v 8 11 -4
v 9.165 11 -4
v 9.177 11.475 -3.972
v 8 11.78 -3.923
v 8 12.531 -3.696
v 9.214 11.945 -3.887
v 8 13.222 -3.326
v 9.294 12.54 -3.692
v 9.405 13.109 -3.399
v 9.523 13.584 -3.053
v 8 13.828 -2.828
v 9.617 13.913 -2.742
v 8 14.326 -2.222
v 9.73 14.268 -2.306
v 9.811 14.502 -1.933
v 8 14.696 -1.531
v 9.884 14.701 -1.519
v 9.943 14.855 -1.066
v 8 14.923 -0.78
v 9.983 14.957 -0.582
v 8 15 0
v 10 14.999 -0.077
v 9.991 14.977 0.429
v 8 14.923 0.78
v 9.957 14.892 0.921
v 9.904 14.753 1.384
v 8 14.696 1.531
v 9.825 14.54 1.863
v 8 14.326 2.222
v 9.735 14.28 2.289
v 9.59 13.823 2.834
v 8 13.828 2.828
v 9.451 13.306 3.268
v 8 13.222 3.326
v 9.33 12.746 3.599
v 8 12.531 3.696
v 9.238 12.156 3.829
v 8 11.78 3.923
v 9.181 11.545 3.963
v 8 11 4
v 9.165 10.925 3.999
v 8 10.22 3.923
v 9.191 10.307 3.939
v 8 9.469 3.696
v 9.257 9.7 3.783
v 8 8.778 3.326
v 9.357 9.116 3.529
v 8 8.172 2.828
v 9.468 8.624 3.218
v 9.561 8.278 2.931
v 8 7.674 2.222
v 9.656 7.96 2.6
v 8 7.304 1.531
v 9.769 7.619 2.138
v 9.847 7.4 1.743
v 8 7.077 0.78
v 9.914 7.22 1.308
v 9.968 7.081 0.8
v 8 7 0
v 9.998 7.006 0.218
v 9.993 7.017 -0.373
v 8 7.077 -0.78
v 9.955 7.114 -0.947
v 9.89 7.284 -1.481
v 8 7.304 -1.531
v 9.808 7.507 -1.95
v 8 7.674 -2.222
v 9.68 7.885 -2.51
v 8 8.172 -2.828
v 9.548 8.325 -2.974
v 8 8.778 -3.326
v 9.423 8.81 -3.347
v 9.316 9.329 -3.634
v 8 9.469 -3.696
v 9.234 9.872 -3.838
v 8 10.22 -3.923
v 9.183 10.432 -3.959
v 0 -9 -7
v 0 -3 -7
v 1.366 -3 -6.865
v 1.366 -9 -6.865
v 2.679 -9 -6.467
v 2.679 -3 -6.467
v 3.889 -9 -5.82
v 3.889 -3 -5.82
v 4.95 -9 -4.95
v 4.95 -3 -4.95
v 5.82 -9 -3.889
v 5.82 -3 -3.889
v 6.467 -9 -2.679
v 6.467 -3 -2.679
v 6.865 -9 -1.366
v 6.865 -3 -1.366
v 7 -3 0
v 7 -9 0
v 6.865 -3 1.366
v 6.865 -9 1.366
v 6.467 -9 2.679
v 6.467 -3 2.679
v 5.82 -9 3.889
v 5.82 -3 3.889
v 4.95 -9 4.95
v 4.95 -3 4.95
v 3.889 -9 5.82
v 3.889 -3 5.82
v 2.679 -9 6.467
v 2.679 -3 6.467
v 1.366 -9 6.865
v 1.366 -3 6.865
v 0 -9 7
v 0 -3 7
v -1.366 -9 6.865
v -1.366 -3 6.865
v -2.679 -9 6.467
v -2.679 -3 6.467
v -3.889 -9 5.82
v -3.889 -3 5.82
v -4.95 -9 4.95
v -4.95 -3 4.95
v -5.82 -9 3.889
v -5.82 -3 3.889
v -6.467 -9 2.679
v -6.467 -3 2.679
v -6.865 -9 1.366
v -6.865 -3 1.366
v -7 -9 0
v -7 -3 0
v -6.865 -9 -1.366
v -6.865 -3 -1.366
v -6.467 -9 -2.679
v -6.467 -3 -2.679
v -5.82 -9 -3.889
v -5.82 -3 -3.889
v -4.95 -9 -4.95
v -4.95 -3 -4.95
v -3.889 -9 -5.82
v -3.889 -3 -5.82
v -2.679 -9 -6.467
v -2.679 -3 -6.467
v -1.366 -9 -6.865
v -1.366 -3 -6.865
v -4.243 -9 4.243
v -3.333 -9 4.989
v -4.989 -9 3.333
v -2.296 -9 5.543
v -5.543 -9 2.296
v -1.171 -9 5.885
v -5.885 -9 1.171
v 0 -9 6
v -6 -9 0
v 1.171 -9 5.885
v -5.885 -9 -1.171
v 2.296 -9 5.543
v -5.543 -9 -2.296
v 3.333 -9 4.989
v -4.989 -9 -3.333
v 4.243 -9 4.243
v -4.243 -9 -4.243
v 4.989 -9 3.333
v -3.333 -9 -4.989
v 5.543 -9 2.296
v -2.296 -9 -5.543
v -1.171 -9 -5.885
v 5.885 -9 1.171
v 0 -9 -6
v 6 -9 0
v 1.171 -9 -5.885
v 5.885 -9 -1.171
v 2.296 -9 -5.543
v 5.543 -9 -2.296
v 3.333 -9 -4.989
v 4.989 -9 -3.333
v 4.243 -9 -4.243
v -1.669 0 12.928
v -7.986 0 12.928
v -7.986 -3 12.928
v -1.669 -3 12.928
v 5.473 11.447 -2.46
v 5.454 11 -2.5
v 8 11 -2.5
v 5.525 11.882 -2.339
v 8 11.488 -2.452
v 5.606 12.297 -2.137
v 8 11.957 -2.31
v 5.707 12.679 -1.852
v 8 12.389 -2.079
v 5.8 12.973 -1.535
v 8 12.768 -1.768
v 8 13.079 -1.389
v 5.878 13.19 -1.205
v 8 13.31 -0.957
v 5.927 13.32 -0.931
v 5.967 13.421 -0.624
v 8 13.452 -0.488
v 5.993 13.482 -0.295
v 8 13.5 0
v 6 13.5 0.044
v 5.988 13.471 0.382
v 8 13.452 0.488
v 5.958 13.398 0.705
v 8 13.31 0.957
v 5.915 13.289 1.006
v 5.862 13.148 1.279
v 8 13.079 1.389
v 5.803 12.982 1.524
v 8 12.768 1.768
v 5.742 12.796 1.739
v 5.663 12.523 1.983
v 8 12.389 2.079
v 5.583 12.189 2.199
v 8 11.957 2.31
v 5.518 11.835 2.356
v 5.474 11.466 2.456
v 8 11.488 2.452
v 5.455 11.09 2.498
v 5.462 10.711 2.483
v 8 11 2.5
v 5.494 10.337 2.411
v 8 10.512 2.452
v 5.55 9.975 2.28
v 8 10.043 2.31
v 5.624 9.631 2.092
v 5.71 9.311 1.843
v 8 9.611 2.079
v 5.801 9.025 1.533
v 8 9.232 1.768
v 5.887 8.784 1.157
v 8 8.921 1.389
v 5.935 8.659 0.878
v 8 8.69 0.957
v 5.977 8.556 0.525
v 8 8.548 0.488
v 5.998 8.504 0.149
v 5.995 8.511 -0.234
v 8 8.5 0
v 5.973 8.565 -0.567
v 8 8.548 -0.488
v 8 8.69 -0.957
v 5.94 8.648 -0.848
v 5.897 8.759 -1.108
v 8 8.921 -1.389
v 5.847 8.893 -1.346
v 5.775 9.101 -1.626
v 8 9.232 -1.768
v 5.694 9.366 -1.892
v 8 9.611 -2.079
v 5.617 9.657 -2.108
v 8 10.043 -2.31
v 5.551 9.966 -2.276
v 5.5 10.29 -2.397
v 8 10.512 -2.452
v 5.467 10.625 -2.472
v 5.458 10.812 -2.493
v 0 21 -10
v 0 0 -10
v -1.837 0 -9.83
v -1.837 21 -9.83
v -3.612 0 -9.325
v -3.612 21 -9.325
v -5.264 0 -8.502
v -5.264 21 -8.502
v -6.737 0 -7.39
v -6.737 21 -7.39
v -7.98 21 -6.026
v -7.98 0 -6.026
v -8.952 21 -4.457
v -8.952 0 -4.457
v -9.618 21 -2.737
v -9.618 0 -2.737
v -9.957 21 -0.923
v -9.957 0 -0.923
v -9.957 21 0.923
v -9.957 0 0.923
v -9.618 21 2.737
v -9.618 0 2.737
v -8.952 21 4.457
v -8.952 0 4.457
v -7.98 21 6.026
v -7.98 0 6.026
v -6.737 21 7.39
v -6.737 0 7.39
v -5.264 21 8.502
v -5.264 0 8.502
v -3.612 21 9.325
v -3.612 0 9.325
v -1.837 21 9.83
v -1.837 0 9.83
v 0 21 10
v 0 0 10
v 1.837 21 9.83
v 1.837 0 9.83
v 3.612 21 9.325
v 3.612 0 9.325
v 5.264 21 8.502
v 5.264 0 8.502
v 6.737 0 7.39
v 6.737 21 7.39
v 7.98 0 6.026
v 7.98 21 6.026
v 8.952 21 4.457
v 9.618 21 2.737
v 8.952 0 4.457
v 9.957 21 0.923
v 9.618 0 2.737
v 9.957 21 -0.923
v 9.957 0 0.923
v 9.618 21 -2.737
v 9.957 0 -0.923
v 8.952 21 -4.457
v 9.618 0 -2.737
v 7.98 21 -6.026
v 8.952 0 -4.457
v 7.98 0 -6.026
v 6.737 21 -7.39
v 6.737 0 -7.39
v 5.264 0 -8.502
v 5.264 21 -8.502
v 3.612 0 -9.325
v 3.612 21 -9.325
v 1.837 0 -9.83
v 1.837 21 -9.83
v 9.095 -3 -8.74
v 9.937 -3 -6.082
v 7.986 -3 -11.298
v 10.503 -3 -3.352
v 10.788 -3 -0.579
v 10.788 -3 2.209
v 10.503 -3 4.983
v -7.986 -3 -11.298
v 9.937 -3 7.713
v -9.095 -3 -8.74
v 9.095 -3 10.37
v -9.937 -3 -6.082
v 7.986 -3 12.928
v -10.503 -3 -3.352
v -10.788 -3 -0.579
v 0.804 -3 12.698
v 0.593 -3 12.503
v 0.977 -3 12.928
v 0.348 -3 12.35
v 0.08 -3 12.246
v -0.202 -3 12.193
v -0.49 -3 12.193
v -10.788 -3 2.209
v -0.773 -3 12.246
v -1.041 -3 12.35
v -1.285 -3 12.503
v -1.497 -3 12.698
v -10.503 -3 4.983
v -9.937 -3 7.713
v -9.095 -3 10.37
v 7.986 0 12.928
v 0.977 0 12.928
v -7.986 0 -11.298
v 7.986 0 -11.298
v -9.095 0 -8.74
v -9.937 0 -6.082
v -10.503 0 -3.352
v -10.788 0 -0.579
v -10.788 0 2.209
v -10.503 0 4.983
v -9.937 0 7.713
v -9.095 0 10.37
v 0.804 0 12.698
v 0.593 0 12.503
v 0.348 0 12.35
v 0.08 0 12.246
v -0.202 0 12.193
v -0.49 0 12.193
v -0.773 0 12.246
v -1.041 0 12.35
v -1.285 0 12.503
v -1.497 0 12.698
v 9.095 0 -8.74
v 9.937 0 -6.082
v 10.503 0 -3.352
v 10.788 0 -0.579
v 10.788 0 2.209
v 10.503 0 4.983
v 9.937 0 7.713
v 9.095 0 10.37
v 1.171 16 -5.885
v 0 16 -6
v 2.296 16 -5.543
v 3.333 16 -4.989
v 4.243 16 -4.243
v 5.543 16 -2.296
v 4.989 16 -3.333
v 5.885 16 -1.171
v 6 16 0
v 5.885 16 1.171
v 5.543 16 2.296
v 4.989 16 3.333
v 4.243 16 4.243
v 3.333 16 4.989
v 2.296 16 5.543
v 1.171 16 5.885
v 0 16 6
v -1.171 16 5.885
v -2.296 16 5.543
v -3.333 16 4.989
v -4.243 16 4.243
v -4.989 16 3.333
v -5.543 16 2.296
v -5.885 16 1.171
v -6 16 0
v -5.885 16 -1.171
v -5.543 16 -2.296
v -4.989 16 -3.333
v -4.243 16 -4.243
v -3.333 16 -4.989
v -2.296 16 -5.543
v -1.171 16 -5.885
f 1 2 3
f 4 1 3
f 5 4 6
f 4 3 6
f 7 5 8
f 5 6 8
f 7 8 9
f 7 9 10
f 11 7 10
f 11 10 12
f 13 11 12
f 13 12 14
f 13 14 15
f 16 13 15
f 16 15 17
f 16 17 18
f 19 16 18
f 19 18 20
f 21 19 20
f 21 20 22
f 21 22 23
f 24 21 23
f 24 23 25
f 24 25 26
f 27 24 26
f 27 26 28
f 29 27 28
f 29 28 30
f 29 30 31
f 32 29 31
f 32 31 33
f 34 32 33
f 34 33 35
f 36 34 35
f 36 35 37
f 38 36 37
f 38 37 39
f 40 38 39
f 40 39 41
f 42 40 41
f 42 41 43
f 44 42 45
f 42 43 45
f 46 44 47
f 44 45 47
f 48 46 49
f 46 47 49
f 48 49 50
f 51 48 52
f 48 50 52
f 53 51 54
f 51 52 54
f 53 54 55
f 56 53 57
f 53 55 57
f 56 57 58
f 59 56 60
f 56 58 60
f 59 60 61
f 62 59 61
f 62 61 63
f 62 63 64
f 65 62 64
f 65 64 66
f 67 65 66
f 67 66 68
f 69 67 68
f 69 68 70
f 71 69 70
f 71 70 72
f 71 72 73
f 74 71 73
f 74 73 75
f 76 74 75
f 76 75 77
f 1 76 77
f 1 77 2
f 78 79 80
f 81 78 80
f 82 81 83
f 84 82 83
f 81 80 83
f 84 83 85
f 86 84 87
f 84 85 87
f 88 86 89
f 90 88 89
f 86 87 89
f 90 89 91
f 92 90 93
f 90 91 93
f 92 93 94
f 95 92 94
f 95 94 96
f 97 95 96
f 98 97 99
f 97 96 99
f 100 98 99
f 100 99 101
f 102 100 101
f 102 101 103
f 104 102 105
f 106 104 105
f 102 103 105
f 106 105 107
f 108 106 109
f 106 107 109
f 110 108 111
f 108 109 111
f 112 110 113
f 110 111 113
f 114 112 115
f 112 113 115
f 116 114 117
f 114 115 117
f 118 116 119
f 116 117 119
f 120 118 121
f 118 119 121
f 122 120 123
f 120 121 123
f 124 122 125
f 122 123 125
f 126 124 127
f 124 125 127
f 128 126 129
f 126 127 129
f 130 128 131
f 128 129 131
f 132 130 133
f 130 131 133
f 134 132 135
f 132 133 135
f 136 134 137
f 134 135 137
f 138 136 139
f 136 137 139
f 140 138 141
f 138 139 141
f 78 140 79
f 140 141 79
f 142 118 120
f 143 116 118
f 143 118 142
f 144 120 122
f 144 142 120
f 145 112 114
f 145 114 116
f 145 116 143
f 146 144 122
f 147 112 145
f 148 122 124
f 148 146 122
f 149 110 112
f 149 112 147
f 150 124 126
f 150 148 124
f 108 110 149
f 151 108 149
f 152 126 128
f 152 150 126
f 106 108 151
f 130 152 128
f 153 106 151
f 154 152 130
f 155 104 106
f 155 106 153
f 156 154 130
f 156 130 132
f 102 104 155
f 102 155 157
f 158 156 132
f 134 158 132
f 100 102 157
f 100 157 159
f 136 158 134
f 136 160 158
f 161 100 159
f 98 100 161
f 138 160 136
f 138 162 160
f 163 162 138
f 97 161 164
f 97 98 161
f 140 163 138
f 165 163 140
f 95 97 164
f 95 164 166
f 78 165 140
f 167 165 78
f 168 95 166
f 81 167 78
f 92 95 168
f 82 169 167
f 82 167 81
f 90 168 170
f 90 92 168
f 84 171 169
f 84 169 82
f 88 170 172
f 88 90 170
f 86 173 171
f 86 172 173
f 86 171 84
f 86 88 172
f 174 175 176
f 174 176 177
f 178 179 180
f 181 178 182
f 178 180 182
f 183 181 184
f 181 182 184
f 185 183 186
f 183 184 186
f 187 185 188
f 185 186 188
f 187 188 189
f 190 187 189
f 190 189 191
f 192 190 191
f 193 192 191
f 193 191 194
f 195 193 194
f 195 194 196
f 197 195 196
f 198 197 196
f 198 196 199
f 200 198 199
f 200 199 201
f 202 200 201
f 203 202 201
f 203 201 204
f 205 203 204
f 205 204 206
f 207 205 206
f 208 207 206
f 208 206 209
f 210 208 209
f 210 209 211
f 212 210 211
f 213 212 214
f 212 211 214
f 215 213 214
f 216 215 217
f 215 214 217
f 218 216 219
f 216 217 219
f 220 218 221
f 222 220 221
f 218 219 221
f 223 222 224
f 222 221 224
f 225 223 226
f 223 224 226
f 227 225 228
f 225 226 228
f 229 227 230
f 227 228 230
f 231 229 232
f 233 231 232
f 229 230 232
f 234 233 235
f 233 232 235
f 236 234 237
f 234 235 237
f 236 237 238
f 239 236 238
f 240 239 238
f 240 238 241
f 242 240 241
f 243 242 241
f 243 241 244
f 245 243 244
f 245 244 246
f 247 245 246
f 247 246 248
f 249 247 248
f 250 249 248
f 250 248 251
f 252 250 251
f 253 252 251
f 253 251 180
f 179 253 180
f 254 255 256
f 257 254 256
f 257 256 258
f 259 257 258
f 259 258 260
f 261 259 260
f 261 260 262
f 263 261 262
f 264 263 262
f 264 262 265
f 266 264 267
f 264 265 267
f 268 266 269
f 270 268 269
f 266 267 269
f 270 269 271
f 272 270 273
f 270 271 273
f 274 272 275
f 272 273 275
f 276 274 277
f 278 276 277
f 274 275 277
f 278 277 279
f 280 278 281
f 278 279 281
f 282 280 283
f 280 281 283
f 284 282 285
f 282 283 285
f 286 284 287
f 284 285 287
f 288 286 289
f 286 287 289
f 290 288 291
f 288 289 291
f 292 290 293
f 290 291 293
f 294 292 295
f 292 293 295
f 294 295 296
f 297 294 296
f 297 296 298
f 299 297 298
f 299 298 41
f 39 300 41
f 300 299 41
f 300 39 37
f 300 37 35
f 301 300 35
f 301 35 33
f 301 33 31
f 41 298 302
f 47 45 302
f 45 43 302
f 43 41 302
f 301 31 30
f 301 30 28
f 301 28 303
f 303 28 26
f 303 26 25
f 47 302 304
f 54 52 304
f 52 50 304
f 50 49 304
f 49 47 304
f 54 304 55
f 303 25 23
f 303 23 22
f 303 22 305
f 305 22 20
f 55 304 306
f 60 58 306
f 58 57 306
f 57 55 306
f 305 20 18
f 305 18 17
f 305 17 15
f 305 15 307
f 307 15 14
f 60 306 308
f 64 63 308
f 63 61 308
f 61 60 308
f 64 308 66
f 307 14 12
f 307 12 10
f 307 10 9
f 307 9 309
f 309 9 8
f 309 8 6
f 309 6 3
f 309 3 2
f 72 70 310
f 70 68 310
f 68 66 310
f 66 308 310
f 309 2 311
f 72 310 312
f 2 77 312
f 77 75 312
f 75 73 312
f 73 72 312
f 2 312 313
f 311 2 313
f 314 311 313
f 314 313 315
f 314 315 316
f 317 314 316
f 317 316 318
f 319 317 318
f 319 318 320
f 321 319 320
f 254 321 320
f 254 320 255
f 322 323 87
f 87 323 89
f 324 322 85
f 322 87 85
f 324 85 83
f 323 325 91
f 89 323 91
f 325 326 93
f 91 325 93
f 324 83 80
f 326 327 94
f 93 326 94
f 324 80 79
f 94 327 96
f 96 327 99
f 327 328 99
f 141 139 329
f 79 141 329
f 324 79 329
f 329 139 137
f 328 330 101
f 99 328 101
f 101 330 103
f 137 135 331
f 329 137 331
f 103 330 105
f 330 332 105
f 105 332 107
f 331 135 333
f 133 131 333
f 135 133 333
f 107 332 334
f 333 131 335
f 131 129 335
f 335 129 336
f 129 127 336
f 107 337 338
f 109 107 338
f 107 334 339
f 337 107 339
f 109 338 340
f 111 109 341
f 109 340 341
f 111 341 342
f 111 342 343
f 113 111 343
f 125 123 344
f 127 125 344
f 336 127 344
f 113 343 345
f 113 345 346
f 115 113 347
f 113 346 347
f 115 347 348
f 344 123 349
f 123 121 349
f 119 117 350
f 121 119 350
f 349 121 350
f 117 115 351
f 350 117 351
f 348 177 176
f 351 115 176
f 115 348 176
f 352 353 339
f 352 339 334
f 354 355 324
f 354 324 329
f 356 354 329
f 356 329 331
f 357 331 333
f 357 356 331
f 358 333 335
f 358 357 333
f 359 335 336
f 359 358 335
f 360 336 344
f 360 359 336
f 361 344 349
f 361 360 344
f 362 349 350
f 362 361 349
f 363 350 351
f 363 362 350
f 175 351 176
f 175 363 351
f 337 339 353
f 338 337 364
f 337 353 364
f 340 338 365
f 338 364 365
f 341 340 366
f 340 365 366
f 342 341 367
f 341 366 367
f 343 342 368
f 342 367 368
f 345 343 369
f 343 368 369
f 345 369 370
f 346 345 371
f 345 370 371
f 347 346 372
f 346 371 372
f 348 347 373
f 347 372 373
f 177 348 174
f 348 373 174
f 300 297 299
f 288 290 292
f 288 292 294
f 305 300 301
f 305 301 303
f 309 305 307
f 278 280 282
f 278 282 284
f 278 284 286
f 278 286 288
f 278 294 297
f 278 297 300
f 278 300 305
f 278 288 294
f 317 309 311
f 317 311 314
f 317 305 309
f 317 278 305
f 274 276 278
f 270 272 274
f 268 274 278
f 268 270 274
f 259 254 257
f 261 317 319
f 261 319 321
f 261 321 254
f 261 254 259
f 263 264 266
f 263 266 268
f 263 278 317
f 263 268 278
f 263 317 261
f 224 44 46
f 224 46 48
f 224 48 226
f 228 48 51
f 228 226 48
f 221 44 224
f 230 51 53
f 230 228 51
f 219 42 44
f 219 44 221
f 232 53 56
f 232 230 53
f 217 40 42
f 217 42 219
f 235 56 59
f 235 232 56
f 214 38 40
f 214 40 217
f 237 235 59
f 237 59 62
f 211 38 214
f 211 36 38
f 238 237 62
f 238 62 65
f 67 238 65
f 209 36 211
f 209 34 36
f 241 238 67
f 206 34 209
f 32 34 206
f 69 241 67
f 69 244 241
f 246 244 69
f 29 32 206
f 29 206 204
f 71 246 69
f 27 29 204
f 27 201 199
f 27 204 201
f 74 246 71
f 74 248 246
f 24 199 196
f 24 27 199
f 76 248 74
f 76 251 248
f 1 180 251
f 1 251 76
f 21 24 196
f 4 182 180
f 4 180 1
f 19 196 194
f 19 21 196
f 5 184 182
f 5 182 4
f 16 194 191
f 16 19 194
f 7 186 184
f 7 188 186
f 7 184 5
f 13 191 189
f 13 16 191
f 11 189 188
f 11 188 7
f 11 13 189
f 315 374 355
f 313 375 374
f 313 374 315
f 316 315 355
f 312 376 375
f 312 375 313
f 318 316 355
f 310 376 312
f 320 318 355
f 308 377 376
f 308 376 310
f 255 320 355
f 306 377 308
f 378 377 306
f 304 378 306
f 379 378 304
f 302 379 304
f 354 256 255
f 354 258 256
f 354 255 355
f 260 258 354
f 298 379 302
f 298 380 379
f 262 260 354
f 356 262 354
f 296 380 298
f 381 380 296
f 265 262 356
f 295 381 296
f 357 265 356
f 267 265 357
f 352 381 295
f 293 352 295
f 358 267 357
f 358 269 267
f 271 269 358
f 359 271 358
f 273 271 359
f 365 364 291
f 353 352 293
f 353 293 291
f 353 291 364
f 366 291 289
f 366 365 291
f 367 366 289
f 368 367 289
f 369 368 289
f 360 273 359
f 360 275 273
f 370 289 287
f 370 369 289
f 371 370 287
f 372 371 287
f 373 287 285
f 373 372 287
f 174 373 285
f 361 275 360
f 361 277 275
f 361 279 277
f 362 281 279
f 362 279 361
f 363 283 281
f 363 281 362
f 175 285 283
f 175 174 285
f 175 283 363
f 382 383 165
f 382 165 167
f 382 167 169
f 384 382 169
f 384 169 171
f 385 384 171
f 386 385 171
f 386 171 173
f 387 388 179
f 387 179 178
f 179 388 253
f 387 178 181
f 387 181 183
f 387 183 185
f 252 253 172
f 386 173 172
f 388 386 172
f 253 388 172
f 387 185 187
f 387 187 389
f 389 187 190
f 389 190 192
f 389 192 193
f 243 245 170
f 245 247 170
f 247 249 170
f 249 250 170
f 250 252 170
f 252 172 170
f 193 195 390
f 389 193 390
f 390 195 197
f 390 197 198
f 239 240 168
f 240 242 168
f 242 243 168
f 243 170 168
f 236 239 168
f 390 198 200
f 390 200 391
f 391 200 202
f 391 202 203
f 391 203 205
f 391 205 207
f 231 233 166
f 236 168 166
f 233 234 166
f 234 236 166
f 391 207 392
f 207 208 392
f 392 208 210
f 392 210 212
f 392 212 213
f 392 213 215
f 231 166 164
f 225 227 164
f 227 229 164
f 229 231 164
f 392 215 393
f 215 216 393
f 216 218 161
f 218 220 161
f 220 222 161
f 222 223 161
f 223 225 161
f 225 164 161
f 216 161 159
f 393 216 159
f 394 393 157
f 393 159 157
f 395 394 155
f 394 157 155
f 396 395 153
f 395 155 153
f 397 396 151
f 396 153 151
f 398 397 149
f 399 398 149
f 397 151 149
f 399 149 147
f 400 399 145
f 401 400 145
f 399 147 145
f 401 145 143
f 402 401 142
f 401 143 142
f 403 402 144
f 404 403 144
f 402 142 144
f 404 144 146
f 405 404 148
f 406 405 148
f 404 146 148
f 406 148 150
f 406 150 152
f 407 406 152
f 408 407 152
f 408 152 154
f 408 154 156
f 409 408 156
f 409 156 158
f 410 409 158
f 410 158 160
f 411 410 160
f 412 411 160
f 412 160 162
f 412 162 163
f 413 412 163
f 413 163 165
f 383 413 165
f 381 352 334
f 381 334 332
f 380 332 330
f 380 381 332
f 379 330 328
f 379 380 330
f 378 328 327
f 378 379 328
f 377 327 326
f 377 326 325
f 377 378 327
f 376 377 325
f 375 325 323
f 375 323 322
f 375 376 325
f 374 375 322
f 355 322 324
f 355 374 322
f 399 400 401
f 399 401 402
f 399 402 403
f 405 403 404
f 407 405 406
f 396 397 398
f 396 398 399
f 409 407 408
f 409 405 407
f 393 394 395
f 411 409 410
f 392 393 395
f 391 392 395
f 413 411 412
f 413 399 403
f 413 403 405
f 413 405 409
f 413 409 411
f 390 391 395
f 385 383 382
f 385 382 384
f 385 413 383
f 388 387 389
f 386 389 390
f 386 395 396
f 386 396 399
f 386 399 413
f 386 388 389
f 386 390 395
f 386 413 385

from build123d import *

# Parameters (mm, degrees)
SKETCH1_R               = 10
BOSS_EXTRUDE1_DEPTH     = 21
BOSS_EXTRUDE2_DEPTH     = 3
SKETCH3_R               = 7
BOSS_EXTRUDE3_DEPTH     = 6
SKETCH4_R               = 6
CUT_EXTRUDE1_DEPTH      = 25
SKETCH5_R               = 4
CUT_EXTRUDE2_DEPTH      = 2
CUT_EXTRUDE3_REACH      = 34.276
CUT_EXTRUDE3_END_RADIUS = 6
SKETCH5_3_R             = 2.5
SKETCH6_R               = 1.55
CUT_EXTRUDE4_DEPTH      = 27.931170886


with BuildPart() as part:
    # Sketch1 → Boss-Extrude1 (new body)
    with BuildSketch(Plane(origin=(0, 0, 0), x_dir=(1, 0, 0), z_dir=(0, 1, 0))):
        with Locations(Location((0, 0, 0), (0, 0, 90))):
            Circle(SKETCH1_R)
    extrude(amount=BOSS_EXTRUDE1_DEPTH)

    # Sketch2 → Boss-Extrude2 (add)
    with BuildSketch(Plane.XZ):
        with BuildLine():
            Line((-7.985787442, 12.928156025), (7.985787442, 12.928156025))
            ThreePointArc((7.985787442, 12.928156025), (10.823619675, 0.815257434), (7.985787442, -11.297641157))
            Line((7.985787442, -11.297641157), (-7.985787442, -11.297641157))
            ThreePointArc((-7.985787442, -11.297641157), (-10.823619675, 0.815257434), (-7.985787442, 12.928156025))
        make_face()
    extrude(amount=BOSS_EXTRUDE2_DEPTH)

    # Sketch3 → Boss-Extrude3 (add)
    with BuildSketch(Plane.XZ.offset(3)):
        with Locations(Location((0, 0, 0), (0, 0, 270))):
            Circle(SKETCH3_R)
    extrude(amount=BOSS_EXTRUDE3_DEPTH)

    # Sketch4 → Cut-Extrude1 (cut)
    with BuildSketch(Plane.XZ.offset(9)):
        with Locations(Location((0, 0, 0), (0, 0, 270))):
            Circle(SKETCH4_R)
    extrude(amount=-CUT_EXTRUDE1_DEPTH, mode=Mode.SUBTRACT)

    # Sketch5 → Cut-Extrude2 (cut)
    with BuildSketch(Plane(origin=(10, 0, 0), x_dir=(0, 0, -1), z_dir=(1, 0, 0))):
        with Locations((0, 11)):
            Circle(SKETCH5_R)
    extrude(amount=-CUT_EXTRUDE2_DEPTH, mode=Mode.SUBTRACT)

    # Cut-Extrude3: up to this cylinder (the profile starts outside it)
    cut_extrude3_end = Plane(origin=(0, 11, 0), z_dir=(0, -1, 0)) * Cylinder(CUT_EXTRUDE3_END_RADIUS, 81.552, mode=Mode.PRIVATE)
    # Sketch5<3> → Cut-Extrude3 (cut, up to the surface)
    with BuildSketch(Plane(origin=(10, 0, 0), x_dir=(0, 0, -1), z_dir=(1, 0, 0)), mode=Mode.PRIVATE) as cut_extrude3_sk1:
        with Locations((0, 11)):
            Circle(SKETCH5_3_R)
    cut_extrude3_tool1 = extrude(cut_extrude3_sk1.sketch, amount=-CUT_EXTRUDE3_REACH, mode=Mode.PRIVATE) - cut_extrude3_end
    add(cut_extrude3_tool1.solids().sort_by_distance((10, 11, 0))[0], mode=Mode.SUBTRACT)

    # Sketch6 → Cut-Extrude4 (cut, through all)
    with BuildSketch(Plane(origin=(0, 0, 0), x_dir=(1, 0, 0), z_dir=(0, 1, 0))):
        with Locations((0.39625422, 13.700444465)):
            Circle(SKETCH6_R)
        with Locations((-0.346325383, -13.735993833)):
            Circle(SKETCH6_R)
    extrude(amount=-CUT_EXTRUDE4_DEPTH, mode=Mode.SUBTRACT)


solid = part.part
